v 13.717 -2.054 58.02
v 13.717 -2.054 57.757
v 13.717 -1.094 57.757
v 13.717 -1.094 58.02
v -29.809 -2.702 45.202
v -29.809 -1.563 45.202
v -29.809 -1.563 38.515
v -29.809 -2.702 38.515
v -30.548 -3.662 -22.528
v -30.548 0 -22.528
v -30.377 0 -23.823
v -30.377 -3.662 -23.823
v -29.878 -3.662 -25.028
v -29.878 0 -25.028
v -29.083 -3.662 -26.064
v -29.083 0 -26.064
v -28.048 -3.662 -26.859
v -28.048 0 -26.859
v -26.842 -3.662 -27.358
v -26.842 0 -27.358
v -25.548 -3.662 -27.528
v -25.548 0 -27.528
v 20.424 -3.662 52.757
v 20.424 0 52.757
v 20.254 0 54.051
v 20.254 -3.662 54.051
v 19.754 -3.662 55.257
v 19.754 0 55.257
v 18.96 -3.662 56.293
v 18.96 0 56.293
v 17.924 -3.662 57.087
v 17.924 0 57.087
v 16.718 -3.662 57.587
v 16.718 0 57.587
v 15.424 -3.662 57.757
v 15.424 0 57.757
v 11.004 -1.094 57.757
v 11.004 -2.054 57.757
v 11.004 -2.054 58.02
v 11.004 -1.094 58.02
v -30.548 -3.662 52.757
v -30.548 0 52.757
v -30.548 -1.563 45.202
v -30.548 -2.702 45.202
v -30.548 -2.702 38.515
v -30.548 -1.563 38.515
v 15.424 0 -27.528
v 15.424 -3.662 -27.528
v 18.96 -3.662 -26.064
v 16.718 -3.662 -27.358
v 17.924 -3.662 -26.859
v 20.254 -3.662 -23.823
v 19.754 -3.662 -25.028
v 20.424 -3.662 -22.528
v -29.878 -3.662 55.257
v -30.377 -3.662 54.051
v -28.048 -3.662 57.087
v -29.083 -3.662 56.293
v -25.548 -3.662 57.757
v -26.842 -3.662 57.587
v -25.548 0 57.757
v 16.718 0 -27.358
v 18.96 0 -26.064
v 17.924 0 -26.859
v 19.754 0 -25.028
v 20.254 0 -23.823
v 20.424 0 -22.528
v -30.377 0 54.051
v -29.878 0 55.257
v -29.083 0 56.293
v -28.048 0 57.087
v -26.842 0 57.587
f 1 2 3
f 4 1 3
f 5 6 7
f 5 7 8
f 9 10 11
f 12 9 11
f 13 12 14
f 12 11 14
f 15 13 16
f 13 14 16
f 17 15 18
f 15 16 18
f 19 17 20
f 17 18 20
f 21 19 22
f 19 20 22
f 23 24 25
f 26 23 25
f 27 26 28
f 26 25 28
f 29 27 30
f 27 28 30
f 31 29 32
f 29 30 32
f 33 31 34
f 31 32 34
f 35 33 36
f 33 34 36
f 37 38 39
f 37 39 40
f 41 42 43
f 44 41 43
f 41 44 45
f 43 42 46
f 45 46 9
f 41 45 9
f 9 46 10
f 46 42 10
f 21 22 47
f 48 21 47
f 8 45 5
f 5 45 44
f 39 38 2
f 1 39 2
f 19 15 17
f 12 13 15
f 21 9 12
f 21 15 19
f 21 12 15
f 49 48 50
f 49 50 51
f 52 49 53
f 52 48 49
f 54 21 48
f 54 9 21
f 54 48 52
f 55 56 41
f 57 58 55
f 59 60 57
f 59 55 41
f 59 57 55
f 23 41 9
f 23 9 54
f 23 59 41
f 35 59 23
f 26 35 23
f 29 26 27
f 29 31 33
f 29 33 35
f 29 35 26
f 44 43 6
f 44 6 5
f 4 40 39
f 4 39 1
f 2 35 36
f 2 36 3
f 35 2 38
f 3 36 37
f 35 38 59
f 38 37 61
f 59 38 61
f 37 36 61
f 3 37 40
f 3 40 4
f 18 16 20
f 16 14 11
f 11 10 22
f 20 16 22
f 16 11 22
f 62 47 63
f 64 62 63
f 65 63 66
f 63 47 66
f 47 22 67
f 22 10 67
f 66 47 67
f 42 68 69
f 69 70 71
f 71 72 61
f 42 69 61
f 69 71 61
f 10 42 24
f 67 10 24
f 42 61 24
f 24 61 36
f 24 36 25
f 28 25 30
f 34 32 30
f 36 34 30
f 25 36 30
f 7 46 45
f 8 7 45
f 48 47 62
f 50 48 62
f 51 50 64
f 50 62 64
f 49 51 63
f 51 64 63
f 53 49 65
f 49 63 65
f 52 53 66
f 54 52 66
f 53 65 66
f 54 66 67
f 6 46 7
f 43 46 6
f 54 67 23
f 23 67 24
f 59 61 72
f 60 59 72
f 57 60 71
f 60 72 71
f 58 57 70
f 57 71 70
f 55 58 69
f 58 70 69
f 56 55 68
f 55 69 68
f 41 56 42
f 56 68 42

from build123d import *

# Parameters (mm, degrees)
F1_DEPTH = 3.661873
F2_W     = 1.138547
F2_H     = 6.686799
F3_DEPTH = 0.739144
F4_W     = 2.712251
F4_H     = 0.959781
F5_DEPTH = 0.262843


with BuildPart() as f1:
    # F0 (on Front) → F1 (new body)
    with BuildSketch(Plane.XZ):
        with BuildLine():
            ThreePointArc((20.424351, 52.757182), (18.959885, 56.292716), (15.424351, 57.757182))
            Line((15.424351, 57.757182), (-25.547678, 57.757182))
            ThreePointArc((-25.547678, 57.757182), (-29.083212, 56.292716), (-30.547678, 52.757182))
            Line((-30.547678, 52.757182), (-30.547678, -22.52845))
            ThreePointArc((-30.547678, -22.52845), (-29.083212, -26.063984), (-25.547678, -27.52845))
            Line((-25.547678, -27.52845), (15.424351, -27.52845))
            ThreePointArc((15.424351, -27.52845), (18.959885, -26.063984), (20.424351, -22.52845))
            Line((20.424351, -22.52845), (20.424351, 52.757182))
        make_face()
    extrude(amount=F1_DEPTH)

    # F2 (on face) → F3 (cut)
    with BuildSketch(Plane(origin=(-30.547678, 0, 0), x_dir=(0, -1, 0), z_dir=(-1, 0, 0))):
        with Locations((2.132756, 41.858722)):
            Rectangle(F2_W, F2_H)
    extrude(amount=-F3_DEPTH, mode=Mode.SUBTRACT)

    # F4 (on face) → F5 (join)
    with BuildSketch(Plane.XY.offset(57.757182)):
        with Locations((12.360551, -1.573705)):
            Rectangle(F4_W, F4_H)
    extrude(amount=F5_DEPTH)


solid = f1.part
